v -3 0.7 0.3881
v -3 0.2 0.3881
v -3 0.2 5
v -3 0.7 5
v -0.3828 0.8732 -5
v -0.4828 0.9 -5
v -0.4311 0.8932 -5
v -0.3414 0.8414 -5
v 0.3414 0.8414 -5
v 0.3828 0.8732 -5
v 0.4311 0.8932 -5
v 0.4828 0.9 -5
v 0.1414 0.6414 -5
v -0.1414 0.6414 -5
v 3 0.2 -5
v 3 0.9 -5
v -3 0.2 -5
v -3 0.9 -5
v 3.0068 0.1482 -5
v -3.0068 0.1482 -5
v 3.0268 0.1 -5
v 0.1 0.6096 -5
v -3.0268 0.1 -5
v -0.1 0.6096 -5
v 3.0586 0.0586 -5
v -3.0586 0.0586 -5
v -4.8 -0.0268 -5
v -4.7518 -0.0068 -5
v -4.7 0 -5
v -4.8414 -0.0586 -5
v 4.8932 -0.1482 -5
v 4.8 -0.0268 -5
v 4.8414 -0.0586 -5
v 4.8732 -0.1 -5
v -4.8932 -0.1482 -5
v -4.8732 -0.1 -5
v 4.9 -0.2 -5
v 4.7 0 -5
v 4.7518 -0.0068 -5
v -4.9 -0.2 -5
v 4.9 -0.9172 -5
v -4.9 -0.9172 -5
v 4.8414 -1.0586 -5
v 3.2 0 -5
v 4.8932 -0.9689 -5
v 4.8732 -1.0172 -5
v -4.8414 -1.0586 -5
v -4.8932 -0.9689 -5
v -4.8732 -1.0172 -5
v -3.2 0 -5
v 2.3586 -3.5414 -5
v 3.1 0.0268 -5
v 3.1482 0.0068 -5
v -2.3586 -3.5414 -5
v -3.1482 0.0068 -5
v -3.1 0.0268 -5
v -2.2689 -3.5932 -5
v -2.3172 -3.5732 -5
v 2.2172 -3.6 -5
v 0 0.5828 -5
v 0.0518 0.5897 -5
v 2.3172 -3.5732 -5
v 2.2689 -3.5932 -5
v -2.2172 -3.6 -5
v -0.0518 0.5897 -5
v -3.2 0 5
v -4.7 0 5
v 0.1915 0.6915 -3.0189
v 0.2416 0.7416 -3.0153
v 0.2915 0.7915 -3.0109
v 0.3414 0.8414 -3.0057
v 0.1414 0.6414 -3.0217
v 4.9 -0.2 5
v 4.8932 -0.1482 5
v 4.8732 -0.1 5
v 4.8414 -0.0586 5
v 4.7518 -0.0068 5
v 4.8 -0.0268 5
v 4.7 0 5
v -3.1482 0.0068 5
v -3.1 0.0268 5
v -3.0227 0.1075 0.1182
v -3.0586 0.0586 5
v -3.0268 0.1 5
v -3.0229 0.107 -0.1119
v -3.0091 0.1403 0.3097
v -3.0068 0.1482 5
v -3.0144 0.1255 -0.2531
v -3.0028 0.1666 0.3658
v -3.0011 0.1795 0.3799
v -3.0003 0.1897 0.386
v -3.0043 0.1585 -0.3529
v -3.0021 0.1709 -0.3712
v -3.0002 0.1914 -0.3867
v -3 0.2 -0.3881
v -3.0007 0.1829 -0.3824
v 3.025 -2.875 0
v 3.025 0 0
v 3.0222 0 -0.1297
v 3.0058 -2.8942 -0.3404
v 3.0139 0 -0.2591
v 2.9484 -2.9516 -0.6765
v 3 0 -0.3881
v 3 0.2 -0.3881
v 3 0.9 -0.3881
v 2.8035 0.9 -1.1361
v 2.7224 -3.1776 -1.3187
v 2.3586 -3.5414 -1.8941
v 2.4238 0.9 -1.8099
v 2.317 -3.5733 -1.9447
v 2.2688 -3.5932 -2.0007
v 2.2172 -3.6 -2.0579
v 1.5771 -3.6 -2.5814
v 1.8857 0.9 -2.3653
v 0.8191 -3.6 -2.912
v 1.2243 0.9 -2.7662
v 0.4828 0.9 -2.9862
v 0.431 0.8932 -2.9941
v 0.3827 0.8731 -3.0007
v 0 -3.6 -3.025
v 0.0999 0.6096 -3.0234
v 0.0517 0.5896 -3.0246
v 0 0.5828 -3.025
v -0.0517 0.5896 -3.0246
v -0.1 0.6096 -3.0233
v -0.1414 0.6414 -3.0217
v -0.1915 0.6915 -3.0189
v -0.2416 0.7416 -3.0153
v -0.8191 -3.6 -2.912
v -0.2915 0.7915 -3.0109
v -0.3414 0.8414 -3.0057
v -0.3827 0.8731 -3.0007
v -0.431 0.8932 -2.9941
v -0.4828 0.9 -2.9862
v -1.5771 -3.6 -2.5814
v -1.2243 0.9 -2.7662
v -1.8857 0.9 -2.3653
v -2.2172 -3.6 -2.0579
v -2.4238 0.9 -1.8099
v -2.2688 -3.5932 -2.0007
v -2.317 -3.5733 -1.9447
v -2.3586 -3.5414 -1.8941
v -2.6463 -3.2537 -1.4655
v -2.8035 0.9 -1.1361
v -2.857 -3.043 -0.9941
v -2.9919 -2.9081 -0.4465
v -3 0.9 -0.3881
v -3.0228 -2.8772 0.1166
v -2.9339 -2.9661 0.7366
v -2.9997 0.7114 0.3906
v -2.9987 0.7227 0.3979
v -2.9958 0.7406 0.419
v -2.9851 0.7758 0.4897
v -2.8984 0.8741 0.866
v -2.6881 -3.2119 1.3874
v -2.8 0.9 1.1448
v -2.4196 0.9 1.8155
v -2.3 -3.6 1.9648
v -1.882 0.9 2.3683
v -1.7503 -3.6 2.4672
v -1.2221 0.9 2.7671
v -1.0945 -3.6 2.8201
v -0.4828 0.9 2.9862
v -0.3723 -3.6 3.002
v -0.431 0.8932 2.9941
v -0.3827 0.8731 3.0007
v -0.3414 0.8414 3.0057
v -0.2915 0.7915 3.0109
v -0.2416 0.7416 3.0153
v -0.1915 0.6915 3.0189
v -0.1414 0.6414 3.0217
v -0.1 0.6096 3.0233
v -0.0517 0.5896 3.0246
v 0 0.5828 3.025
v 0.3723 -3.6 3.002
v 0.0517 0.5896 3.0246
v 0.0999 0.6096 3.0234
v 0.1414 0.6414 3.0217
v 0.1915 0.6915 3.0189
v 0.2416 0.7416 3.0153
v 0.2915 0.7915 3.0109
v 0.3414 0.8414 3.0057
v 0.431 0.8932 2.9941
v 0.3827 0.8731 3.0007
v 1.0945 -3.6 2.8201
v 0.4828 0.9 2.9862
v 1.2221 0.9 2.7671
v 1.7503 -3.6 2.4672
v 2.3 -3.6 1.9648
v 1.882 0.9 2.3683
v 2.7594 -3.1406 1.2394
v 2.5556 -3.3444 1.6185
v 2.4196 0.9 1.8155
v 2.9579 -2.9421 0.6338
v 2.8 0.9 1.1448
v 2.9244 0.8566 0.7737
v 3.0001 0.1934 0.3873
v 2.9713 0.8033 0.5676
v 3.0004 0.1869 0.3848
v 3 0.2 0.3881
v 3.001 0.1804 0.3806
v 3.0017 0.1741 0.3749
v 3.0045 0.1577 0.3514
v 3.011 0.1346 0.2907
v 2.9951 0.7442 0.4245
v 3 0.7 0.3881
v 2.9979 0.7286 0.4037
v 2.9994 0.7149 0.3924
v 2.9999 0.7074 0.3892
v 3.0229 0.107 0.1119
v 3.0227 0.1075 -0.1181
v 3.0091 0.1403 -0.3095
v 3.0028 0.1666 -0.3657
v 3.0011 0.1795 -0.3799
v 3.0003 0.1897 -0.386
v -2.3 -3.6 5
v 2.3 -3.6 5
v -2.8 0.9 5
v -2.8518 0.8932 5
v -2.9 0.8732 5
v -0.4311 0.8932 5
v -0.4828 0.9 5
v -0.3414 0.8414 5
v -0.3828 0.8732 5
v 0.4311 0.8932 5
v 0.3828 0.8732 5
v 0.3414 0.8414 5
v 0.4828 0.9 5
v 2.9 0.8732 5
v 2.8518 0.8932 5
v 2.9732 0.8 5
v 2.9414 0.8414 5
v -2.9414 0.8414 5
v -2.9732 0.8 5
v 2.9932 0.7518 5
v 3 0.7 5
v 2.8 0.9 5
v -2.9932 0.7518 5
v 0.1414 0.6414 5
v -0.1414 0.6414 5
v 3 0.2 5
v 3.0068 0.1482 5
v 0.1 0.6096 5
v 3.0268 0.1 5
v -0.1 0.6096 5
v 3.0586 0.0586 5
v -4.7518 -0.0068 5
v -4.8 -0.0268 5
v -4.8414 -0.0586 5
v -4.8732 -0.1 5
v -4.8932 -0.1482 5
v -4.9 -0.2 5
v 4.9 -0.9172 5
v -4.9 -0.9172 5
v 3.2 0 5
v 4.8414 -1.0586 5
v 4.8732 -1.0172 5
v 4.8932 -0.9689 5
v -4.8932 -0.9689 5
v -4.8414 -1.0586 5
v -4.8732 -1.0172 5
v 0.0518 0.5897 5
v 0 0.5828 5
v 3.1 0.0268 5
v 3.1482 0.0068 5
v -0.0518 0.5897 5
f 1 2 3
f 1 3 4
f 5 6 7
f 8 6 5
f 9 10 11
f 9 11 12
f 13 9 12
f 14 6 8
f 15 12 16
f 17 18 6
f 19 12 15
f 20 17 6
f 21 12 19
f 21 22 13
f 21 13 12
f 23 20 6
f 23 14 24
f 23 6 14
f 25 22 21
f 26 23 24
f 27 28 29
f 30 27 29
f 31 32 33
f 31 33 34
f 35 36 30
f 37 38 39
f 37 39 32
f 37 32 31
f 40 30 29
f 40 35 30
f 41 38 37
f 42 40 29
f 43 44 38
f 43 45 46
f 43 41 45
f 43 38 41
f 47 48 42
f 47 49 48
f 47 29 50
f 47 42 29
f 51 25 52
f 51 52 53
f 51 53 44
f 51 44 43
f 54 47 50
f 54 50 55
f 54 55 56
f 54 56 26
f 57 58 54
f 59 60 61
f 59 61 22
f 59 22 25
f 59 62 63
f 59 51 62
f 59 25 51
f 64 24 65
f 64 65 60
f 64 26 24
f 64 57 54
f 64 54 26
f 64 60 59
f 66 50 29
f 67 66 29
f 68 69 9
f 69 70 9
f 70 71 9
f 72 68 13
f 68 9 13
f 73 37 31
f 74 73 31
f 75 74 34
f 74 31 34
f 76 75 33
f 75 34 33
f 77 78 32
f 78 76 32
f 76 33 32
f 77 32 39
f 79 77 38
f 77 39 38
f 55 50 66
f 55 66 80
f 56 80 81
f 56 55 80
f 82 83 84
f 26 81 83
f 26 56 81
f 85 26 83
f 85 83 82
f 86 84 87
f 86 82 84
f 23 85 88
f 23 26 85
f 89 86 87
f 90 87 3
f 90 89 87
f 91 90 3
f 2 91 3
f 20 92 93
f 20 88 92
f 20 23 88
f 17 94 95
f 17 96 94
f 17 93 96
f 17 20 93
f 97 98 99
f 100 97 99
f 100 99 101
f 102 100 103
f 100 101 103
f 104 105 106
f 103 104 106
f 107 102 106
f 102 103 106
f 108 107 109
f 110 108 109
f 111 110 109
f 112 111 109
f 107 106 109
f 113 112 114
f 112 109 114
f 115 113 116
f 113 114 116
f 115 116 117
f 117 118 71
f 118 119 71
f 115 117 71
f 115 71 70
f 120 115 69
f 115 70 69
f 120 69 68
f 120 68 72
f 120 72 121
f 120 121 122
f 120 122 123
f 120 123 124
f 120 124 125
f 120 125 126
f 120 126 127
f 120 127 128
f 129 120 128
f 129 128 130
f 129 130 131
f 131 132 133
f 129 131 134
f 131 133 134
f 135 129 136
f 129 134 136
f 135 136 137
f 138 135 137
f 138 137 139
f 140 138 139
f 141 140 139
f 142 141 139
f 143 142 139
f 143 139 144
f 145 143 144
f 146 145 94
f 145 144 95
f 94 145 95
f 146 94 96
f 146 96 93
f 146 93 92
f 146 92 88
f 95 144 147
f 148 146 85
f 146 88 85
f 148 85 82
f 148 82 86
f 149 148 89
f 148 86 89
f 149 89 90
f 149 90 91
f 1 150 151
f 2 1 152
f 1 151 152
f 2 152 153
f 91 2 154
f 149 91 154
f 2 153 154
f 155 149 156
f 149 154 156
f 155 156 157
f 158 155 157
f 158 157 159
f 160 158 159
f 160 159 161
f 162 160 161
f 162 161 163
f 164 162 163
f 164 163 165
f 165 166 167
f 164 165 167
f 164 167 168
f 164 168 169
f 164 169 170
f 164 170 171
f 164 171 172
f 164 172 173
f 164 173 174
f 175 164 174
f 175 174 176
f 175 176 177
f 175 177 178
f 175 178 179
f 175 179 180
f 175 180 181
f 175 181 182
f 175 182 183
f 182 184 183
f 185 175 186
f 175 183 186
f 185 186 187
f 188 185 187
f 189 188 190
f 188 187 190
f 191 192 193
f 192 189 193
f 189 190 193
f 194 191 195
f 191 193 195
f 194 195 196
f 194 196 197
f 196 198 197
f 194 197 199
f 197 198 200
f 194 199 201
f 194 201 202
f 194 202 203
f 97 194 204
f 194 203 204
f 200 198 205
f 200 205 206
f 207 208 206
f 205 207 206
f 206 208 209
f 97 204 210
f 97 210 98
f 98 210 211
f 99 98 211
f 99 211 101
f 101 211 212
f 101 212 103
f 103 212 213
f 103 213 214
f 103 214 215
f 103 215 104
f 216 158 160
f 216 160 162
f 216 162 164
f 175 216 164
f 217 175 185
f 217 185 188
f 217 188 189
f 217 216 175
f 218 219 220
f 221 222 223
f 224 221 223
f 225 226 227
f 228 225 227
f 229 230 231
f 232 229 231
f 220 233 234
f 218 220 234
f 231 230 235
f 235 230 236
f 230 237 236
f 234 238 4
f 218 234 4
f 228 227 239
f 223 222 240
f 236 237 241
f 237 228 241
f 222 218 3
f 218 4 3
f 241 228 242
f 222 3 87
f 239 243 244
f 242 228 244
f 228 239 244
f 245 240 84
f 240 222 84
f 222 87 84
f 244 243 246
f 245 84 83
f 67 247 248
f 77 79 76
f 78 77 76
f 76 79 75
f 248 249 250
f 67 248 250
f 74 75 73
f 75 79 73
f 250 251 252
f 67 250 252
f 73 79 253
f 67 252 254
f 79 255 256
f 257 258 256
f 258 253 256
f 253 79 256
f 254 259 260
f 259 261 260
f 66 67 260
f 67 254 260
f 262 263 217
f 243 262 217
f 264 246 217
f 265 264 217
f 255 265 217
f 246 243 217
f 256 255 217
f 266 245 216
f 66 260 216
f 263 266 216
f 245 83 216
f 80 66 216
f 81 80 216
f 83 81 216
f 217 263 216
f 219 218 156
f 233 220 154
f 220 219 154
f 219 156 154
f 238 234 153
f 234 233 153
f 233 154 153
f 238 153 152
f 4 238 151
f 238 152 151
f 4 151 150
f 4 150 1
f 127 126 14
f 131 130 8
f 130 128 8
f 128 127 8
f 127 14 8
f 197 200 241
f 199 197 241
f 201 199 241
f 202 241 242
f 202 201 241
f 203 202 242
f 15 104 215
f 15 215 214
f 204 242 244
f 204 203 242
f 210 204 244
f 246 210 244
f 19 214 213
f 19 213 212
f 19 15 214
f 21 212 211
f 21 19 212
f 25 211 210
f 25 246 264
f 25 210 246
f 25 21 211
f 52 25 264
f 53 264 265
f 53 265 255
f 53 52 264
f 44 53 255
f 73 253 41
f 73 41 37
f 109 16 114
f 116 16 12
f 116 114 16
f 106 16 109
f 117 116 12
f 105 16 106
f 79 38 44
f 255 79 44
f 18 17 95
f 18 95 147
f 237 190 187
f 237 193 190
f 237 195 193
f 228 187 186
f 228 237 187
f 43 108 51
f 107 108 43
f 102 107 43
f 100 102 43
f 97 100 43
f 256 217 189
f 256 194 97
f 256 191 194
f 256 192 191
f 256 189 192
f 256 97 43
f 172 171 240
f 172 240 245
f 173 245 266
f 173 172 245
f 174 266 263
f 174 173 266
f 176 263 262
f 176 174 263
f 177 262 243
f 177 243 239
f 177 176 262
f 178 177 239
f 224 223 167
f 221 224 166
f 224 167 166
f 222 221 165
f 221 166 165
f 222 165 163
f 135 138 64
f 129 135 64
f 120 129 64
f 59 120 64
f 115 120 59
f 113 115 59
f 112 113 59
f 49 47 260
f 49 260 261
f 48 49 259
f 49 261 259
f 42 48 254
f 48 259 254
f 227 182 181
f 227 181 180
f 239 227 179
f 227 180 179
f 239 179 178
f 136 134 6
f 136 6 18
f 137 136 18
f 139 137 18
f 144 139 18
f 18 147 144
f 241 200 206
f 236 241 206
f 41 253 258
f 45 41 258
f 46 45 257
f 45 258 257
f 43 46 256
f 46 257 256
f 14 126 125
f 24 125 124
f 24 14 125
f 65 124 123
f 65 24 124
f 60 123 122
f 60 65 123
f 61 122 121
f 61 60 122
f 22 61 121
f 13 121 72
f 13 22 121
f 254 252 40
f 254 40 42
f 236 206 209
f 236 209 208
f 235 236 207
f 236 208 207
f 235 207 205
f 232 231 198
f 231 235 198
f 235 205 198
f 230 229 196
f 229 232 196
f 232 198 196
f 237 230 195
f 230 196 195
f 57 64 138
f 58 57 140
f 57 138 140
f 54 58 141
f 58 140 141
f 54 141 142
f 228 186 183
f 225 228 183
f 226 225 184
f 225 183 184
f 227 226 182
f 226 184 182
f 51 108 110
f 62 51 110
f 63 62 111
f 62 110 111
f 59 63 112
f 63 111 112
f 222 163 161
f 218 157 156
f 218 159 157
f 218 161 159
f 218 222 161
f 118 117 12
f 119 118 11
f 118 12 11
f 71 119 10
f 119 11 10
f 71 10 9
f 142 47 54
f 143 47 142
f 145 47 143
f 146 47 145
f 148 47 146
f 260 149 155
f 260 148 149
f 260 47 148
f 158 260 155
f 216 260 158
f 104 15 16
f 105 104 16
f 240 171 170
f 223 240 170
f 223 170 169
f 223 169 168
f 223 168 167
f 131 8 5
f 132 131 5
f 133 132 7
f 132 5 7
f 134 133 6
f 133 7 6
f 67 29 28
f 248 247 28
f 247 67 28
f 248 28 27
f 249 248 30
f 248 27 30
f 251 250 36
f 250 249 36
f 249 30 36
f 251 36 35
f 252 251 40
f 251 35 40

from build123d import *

# Parameters (mm, degrees)
EXTRUDE_BODY_DEPTH = 10
SKETCH2_W          = 1.9
SKETCH2_H          = 0.9
CUT_EXTRUDE1_DEPTH = 12.703418304
SKETCH3_W          = 1.9
SKETCH3_H          = 0.9
CUT_EXTRUDE2_DEPTH = 12.703418304
CUT_EXTRUDE3_DEPTH = 12.703418304
HOLE_REVOLVE_D     = 6.05
EDGE_FILLETS_R     = 0.2


with BuildPart() as part:
    # Sketch1 → Extrude Body (new body)
    with BuildSketch(Plane.XY.offset(5)):
        Polygon((4.9, -1), (4.9, 0.9), (-4.9, 0.9), (-4.9, -1), (-2.3, -3.6), (2.3, -3.6), align=None)
    extrude(amount=-EXTRUDE_BODY_DEPTH)

    # Sketch2 → Cut-Extrude1 (cut, through all)
    with BuildSketch(Plane(origin=(0, 0, -5), x_dir=(-1, 0, 0), z_dir=(0, 0, -1))):
        with Locations((3.95, 0.45)):
            Rectangle(SKETCH2_W, SKETCH2_H)
    extrude(amount=-CUT_EXTRUDE1_DEPTH, mode=Mode.SUBTRACT)

    # Sketch3 → Cut-Extrude2 (cut, through all)
    with BuildSketch(Plane(origin=(0, 0, -5), x_dir=(-1, 0, 0), z_dir=(0, 0, -1))):
        with Locations((-3.95, 0.45)):
            Rectangle(SKETCH3_W, SKETCH3_H)
    extrude(amount=-CUT_EXTRUDE2_DEPTH, mode=Mode.SUBTRACT)

    # Sketch4 → Cut-Extrude3 (cut, through all)
    with BuildSketch(Plane(origin=(0, 0, -5), x_dir=(-1, 0, 0), z_dir=(0, 0, -1))):
        Polygon((0.4, 0.9), (-0.4, 0.9), (0, 0.5), align=None)
    extrude(amount=-CUT_EXTRUDE3_DEPTH, mode=Mode.SUBTRACT)

    # Hole Revolve (through all)
    with Locations(Plane(origin=(0, -3.6, 0), x_dir=(-1, 0, 0), z_dir=(0, -1, 0))):
        with Locations((0, 0)):
            Hole(HOLE_REVOLVE_D / 2)

    # Edge Fillets
    # the kernel refuses this fillet: 0.2 mm, written as the material it adds along each edge
    with BuildSketch(Plane(origin=(3, 0, -5), x_dir=(1, 0, 0), z_dir=(0, 0, 1))) as edge_fillets_piece_1_section:
        with BuildLine():
            CenterArc((EDGE_FILLETS_R, EDGE_FILLETS_R), EDGE_FILLETS_R, 180, 90)
            Line((0, EDGE_FILLETS_R), (0, 0))
            Line((0, 0), (EDGE_FILLETS_R, 0))
        make_face()
    edge_fillets_piece_1 = extrude(amount=5.111895633, mode=Mode.PRIVATE)
    edge_fillets_piece_1 = edge_fillets_piece_1 - Plane(origin=(0, 0.044194975, 0), x_dir=(1, 0, 0), z_dir=(0, 1, 0)) * Cylinder(3.025, 12, mode=Mode.PRIVATE)
    add(edge_fillets_piece_1)
    with BuildSketch(Plane(origin=(3, 0, -0.111895633), x_dir=(1, 0, 0), z_dir=(0, 0, 1))) as edge_fillets_piece_2_section:
        with BuildLine():
            CenterArc((EDGE_FILLETS_R, EDGE_FILLETS_R), EDGE_FILLETS_R, 180, 90)
            Line((0, EDGE_FILLETS_R), (0, 0))
            Line((0, 0), (EDGE_FILLETS_R, 0))
        make_face()
    edge_fillets_piece_2 = extrude(amount=5.111895633, mode=Mode.PRIVATE)
    edge_fillets_piece_2 = edge_fillets_piece_2 - Plane(origin=(0, 0.044194976, 0), x_dir=(1, 0, 0), z_dir=(0, 1, 0)) * Cylinder(3.025, 12, mode=Mode.PRIVATE)
    add(edge_fillets_piece_2)
    with BuildSketch(Plane(origin=(-3, 0, -0.111895633), x_dir=(-1, 0, 0), z_dir=(0, 0, 1))) as edge_fillets_piece_3_section:
        with BuildLine():
            CenterArc((EDGE_FILLETS_R, -EDGE_FILLETS_R), EDGE_FILLETS_R, 90, 90)
            Line((0, -EDGE_FILLETS_R), (0, 0))
            Line((0, 0), (EDGE_FILLETS_R, 0))
        make_face()
    edge_fillets_piece_3 = extrude(amount=5.111895633, mode=Mode.PRIVATE)
    edge_fillets_piece_3 = edge_fillets_piece_3 - Plane(origin=(0, 0.044194976, 0), x_dir=(1, 0, 0), z_dir=(0, 1, 0)) * Cylinder(3.025, 12, mode=Mode.PRIVATE)
    add(edge_fillets_piece_3)
    with BuildSketch(Plane(origin=(-3, 0, -5), x_dir=(-1, 0, 0), z_dir=(0, 0, 1))) as edge_fillets_piece_4_section:
        with BuildLine():
            CenterArc((EDGE_FILLETS_R, -EDGE_FILLETS_R), EDGE_FILLETS_R, 90, 90)
            Line((0, -EDGE_FILLETS_R), (0, 0))
            Line((0, 0), (EDGE_FILLETS_R, 0))
        make_face()
    edge_fillets_piece_4 = extrude(amount=5.111895633, mode=Mode.PRIVATE)
    edge_fillets_piece_4 = edge_fillets_piece_4 - Plane(origin=(0, 0.044194976, 0), x_dir=(1, 0, 0), z_dir=(0, 1, 0)) * Cylinder(3.025, 12, mode=Mode.PRIVATE)
    add(edge_fillets_piece_4)
    with BuildSketch(Plane(origin=(0, 0.5, 2.525), x_dir=(-0.7071067811865454, 0.7071067811865497, 0), z_dir=(0, 0, 1))) as edge_fillets_piece_5_section:
        with BuildLine():
            CenterArc((EDGE_FILLETS_R, -EDGE_FILLETS_R), EDGE_FILLETS_R, 90, 90)
            Line((0, -EDGE_FILLETS_R), (0, 0))
            Line((0, 0), (EDGE_FILLETS_R, 0))
        make_face()
    edge_fillets_piece_5 = extrude(amount=2.475, mode=Mode.PRIVATE)
    edge_fillets_piece_5 = edge_fillets_piece_5 - Plane(origin=(0, 0.564041319, 0), x_dir=(1, 0, 0), z_dir=(0, 1, 0)) * Cylinder(3.025, 6, mode=Mode.PRIVATE)
    add(edge_fillets_piece_5)
    with BuildSketch(Plane(origin=(0, 0.5, -5), x_dir=(-0.7071067811865455, 0.7071067811865496, 0), z_dir=(0, 0, 1))) as edge_fillets_piece_6_section:
        with BuildLine():
            CenterArc((EDGE_FILLETS_R, -EDGE_FILLETS_R), EDGE_FILLETS_R, 90, 90)
            Line((0, -EDGE_FILLETS_R), (0, 0))
            Line((0, 0), (EDGE_FILLETS_R, 0))
        make_face()
    edge_fillets_piece_6 = extrude(amount=2.475, mode=Mode.PRIVATE)
    edge_fillets_piece_6 = edge_fillets_piece_6 - Plane(origin=(0, 0.564041319, 0), x_dir=(1, 0, 0), z_dir=(0, 1, 0)) * Cylinder(3.025, 6, mode=Mode.PRIVATE)
    add(edge_fillets_piece_6)
    # the kernel refuses this fillet: 0.2 mm, written as the material it takes off along each edge
    with BuildSketch(Plane(origin=(4.9, 0, -5.5), x_dir=(0, -1, 0), z_dir=(0, 0, 1))) as edge_fillets_2_piece_1:
        with BuildLine():
            CenterArc((EDGE_FILLETS_R, -EDGE_FILLETS_R), EDGE_FILLETS_R, 90, 90)
            Line((0, -EDGE_FILLETS_R), (0, 0))
            Line((0, 0), (EDGE_FILLETS_R, 0))
        make_face()
    extrude(amount=11, mode=Mode.SUBTRACT)
    with BuildSketch(Plane(origin=(-4.9, -1, 5.207106781), x_dir=(0.7071067811865468, -0.7071067811865481, 0), z_dir=(0, 0, -1)), Plane(origin=(4.9, -1, 5.207106781), x_dir=(0, 1, 0), z_dir=(0, 0, -1))) as edge_fillets_2_piece_2:
        with BuildLine():
            CenterArc((EDGE_FILLETS_R * 0.414213562373, -EDGE_FILLETS_R), EDGE_FILLETS_R, 90, 45)
            Line((-EDGE_FILLETS_R * 0.292893218813, -EDGE_FILLETS_R * 0.292893218813), (0, 0))
            Line((0, 0), (EDGE_FILLETS_R * 0.414213562373, 0))
        make_face()
    extrude(amount=10.414213562, mode=Mode.SUBTRACT)
    with BuildSketch(Plane(origin=(3, 0.9, -0.111895633), x_dir=(-1, 0, 0), z_dir=(0, 0, 1)), Plane(origin=(-3, 0.9, -0.111895633), x_dir=(0, -1, 0), z_dir=(0, 0, 1))) as edge_fillets_2_piece_3:
        with BuildLine():
            CenterArc((EDGE_FILLETS_R, EDGE_FILLETS_R), EDGE_FILLETS_R, 180, 90)
            Line((0, EDGE_FILLETS_R), (0, 0))
            Line((0, 0), (EDGE_FILLETS_R, 0))
        make_face()
    extrude(amount=5.611895633, mode=Mode.SUBTRACT)
    with BuildSketch(Plane(origin=(0.4, 0.9, -5.207106781), x_dir=(1, 0, 0), z_dir=(0, 0, 1)), Plane(origin=(-0.4, 0.9, -5.207106781), x_dir=(0.7071067811865449, -0.7071067811865502, 0), z_dir=(0, 0, 1))) as edge_fillets_2_piece_4:
        with BuildLine():
            CenterArc((EDGE_FILLETS_R * 0.414213562373, -EDGE_FILLETS_R), EDGE_FILLETS_R, 90, 45)
            Line((-EDGE_FILLETS_R * 0.292893218813, -EDGE_FILLETS_R * 0.292893218813), (0, 0))
            Line((0, 0), (EDGE_FILLETS_R * 0.414213562373, 0))
        make_face()
    extrude(amount=2.415776469, mode=Mode.SUBTRACT)
    with BuildSketch(Plane(origin=(-0.4, 0.9, 2.791330312), x_dir=(-1, 0, 0), z_dir=(0, 0, 1)), Plane(origin=(0.4, 0.9, 2.791330312), x_dir=(-0.7071067811865465, -0.7071067811865485, 0), z_dir=(0, 0, 1))) as edge_fillets_2_piece_5:
        with BuildLine():
            CenterArc((EDGE_FILLETS_R * 0.414213562373, EDGE_FILLETS_R), EDGE_FILLETS_R, 225, 45)
            Line((-EDGE_FILLETS_R * 0.292893218813, EDGE_FILLETS_R * 0.292893218813), (0, 0))
            Line((0, 0), (EDGE_FILLETS_R * 0.414213562373, 0))
        make_face()
    extrude(amount=2.415776469, mode=Mode.SUBTRACT)
    with BuildSketch(Plane(origin=(-4.9, 0, -5.5), x_dir=(0, -1, 0), z_dir=(0, 0, 1))) as edge_fillets_2_piece_6:
        with BuildLine():
            CenterArc((EDGE_FILLETS_R, EDGE_FILLETS_R), EDGE_FILLETS_R, 180, 90)
            Line((0, EDGE_FILLETS_R), (0, 0))
            Line((0, 0), (EDGE_FILLETS_R, 0))
        make_face()
    extrude(amount=11, mode=Mode.SUBTRACT)
    with BuildSketch(Plane(origin=(-2.3, -3.6, -1.757740541), x_dir=(-0.7071067811865448, 0.7071067811865502, 0), z_dir=(0, 0, -1))) as edge_fillets_2_piece_7:
        with BuildLine():
            CenterArc((EDGE_FILLETS_R * 0.414213562373, EDGE_FILLETS_R), EDGE_FILLETS_R, 225, 45)
            Line((-EDGE_FILLETS_R * 0.292893218813, EDGE_FILLETS_R * 0.292893218813), (0, 0))
            Line((0, 0), (EDGE_FILLETS_R * 0.414213562373, 0))
        make_face()
    extrude(amount=3.44936624, mode=Mode.SUBTRACT)
    with BuildSketch(Plane(origin=(2.3, -3.6, -1.757740541), x_dir=(0.7071067811865476, 0.7071067811865476, 0), z_dir=(0, 0, -1))) as edge_fillets_2_piece_8:
        with BuildLine():
            CenterArc((EDGE_FILLETS_R * 0.414213562373, -EDGE_FILLETS_R), EDGE_FILLETS_R, 90, 45)
            Line((-EDGE_FILLETS_R * 0.292893218813, -EDGE_FILLETS_R * 0.292893218813), (0, 0))
            Line((0, 0), (EDGE_FILLETS_R * 0.414213562373, 0))
        make_face()
    extrude(amount=3.44936624, mode=Mode.SUBTRACT)


solid = part.part
